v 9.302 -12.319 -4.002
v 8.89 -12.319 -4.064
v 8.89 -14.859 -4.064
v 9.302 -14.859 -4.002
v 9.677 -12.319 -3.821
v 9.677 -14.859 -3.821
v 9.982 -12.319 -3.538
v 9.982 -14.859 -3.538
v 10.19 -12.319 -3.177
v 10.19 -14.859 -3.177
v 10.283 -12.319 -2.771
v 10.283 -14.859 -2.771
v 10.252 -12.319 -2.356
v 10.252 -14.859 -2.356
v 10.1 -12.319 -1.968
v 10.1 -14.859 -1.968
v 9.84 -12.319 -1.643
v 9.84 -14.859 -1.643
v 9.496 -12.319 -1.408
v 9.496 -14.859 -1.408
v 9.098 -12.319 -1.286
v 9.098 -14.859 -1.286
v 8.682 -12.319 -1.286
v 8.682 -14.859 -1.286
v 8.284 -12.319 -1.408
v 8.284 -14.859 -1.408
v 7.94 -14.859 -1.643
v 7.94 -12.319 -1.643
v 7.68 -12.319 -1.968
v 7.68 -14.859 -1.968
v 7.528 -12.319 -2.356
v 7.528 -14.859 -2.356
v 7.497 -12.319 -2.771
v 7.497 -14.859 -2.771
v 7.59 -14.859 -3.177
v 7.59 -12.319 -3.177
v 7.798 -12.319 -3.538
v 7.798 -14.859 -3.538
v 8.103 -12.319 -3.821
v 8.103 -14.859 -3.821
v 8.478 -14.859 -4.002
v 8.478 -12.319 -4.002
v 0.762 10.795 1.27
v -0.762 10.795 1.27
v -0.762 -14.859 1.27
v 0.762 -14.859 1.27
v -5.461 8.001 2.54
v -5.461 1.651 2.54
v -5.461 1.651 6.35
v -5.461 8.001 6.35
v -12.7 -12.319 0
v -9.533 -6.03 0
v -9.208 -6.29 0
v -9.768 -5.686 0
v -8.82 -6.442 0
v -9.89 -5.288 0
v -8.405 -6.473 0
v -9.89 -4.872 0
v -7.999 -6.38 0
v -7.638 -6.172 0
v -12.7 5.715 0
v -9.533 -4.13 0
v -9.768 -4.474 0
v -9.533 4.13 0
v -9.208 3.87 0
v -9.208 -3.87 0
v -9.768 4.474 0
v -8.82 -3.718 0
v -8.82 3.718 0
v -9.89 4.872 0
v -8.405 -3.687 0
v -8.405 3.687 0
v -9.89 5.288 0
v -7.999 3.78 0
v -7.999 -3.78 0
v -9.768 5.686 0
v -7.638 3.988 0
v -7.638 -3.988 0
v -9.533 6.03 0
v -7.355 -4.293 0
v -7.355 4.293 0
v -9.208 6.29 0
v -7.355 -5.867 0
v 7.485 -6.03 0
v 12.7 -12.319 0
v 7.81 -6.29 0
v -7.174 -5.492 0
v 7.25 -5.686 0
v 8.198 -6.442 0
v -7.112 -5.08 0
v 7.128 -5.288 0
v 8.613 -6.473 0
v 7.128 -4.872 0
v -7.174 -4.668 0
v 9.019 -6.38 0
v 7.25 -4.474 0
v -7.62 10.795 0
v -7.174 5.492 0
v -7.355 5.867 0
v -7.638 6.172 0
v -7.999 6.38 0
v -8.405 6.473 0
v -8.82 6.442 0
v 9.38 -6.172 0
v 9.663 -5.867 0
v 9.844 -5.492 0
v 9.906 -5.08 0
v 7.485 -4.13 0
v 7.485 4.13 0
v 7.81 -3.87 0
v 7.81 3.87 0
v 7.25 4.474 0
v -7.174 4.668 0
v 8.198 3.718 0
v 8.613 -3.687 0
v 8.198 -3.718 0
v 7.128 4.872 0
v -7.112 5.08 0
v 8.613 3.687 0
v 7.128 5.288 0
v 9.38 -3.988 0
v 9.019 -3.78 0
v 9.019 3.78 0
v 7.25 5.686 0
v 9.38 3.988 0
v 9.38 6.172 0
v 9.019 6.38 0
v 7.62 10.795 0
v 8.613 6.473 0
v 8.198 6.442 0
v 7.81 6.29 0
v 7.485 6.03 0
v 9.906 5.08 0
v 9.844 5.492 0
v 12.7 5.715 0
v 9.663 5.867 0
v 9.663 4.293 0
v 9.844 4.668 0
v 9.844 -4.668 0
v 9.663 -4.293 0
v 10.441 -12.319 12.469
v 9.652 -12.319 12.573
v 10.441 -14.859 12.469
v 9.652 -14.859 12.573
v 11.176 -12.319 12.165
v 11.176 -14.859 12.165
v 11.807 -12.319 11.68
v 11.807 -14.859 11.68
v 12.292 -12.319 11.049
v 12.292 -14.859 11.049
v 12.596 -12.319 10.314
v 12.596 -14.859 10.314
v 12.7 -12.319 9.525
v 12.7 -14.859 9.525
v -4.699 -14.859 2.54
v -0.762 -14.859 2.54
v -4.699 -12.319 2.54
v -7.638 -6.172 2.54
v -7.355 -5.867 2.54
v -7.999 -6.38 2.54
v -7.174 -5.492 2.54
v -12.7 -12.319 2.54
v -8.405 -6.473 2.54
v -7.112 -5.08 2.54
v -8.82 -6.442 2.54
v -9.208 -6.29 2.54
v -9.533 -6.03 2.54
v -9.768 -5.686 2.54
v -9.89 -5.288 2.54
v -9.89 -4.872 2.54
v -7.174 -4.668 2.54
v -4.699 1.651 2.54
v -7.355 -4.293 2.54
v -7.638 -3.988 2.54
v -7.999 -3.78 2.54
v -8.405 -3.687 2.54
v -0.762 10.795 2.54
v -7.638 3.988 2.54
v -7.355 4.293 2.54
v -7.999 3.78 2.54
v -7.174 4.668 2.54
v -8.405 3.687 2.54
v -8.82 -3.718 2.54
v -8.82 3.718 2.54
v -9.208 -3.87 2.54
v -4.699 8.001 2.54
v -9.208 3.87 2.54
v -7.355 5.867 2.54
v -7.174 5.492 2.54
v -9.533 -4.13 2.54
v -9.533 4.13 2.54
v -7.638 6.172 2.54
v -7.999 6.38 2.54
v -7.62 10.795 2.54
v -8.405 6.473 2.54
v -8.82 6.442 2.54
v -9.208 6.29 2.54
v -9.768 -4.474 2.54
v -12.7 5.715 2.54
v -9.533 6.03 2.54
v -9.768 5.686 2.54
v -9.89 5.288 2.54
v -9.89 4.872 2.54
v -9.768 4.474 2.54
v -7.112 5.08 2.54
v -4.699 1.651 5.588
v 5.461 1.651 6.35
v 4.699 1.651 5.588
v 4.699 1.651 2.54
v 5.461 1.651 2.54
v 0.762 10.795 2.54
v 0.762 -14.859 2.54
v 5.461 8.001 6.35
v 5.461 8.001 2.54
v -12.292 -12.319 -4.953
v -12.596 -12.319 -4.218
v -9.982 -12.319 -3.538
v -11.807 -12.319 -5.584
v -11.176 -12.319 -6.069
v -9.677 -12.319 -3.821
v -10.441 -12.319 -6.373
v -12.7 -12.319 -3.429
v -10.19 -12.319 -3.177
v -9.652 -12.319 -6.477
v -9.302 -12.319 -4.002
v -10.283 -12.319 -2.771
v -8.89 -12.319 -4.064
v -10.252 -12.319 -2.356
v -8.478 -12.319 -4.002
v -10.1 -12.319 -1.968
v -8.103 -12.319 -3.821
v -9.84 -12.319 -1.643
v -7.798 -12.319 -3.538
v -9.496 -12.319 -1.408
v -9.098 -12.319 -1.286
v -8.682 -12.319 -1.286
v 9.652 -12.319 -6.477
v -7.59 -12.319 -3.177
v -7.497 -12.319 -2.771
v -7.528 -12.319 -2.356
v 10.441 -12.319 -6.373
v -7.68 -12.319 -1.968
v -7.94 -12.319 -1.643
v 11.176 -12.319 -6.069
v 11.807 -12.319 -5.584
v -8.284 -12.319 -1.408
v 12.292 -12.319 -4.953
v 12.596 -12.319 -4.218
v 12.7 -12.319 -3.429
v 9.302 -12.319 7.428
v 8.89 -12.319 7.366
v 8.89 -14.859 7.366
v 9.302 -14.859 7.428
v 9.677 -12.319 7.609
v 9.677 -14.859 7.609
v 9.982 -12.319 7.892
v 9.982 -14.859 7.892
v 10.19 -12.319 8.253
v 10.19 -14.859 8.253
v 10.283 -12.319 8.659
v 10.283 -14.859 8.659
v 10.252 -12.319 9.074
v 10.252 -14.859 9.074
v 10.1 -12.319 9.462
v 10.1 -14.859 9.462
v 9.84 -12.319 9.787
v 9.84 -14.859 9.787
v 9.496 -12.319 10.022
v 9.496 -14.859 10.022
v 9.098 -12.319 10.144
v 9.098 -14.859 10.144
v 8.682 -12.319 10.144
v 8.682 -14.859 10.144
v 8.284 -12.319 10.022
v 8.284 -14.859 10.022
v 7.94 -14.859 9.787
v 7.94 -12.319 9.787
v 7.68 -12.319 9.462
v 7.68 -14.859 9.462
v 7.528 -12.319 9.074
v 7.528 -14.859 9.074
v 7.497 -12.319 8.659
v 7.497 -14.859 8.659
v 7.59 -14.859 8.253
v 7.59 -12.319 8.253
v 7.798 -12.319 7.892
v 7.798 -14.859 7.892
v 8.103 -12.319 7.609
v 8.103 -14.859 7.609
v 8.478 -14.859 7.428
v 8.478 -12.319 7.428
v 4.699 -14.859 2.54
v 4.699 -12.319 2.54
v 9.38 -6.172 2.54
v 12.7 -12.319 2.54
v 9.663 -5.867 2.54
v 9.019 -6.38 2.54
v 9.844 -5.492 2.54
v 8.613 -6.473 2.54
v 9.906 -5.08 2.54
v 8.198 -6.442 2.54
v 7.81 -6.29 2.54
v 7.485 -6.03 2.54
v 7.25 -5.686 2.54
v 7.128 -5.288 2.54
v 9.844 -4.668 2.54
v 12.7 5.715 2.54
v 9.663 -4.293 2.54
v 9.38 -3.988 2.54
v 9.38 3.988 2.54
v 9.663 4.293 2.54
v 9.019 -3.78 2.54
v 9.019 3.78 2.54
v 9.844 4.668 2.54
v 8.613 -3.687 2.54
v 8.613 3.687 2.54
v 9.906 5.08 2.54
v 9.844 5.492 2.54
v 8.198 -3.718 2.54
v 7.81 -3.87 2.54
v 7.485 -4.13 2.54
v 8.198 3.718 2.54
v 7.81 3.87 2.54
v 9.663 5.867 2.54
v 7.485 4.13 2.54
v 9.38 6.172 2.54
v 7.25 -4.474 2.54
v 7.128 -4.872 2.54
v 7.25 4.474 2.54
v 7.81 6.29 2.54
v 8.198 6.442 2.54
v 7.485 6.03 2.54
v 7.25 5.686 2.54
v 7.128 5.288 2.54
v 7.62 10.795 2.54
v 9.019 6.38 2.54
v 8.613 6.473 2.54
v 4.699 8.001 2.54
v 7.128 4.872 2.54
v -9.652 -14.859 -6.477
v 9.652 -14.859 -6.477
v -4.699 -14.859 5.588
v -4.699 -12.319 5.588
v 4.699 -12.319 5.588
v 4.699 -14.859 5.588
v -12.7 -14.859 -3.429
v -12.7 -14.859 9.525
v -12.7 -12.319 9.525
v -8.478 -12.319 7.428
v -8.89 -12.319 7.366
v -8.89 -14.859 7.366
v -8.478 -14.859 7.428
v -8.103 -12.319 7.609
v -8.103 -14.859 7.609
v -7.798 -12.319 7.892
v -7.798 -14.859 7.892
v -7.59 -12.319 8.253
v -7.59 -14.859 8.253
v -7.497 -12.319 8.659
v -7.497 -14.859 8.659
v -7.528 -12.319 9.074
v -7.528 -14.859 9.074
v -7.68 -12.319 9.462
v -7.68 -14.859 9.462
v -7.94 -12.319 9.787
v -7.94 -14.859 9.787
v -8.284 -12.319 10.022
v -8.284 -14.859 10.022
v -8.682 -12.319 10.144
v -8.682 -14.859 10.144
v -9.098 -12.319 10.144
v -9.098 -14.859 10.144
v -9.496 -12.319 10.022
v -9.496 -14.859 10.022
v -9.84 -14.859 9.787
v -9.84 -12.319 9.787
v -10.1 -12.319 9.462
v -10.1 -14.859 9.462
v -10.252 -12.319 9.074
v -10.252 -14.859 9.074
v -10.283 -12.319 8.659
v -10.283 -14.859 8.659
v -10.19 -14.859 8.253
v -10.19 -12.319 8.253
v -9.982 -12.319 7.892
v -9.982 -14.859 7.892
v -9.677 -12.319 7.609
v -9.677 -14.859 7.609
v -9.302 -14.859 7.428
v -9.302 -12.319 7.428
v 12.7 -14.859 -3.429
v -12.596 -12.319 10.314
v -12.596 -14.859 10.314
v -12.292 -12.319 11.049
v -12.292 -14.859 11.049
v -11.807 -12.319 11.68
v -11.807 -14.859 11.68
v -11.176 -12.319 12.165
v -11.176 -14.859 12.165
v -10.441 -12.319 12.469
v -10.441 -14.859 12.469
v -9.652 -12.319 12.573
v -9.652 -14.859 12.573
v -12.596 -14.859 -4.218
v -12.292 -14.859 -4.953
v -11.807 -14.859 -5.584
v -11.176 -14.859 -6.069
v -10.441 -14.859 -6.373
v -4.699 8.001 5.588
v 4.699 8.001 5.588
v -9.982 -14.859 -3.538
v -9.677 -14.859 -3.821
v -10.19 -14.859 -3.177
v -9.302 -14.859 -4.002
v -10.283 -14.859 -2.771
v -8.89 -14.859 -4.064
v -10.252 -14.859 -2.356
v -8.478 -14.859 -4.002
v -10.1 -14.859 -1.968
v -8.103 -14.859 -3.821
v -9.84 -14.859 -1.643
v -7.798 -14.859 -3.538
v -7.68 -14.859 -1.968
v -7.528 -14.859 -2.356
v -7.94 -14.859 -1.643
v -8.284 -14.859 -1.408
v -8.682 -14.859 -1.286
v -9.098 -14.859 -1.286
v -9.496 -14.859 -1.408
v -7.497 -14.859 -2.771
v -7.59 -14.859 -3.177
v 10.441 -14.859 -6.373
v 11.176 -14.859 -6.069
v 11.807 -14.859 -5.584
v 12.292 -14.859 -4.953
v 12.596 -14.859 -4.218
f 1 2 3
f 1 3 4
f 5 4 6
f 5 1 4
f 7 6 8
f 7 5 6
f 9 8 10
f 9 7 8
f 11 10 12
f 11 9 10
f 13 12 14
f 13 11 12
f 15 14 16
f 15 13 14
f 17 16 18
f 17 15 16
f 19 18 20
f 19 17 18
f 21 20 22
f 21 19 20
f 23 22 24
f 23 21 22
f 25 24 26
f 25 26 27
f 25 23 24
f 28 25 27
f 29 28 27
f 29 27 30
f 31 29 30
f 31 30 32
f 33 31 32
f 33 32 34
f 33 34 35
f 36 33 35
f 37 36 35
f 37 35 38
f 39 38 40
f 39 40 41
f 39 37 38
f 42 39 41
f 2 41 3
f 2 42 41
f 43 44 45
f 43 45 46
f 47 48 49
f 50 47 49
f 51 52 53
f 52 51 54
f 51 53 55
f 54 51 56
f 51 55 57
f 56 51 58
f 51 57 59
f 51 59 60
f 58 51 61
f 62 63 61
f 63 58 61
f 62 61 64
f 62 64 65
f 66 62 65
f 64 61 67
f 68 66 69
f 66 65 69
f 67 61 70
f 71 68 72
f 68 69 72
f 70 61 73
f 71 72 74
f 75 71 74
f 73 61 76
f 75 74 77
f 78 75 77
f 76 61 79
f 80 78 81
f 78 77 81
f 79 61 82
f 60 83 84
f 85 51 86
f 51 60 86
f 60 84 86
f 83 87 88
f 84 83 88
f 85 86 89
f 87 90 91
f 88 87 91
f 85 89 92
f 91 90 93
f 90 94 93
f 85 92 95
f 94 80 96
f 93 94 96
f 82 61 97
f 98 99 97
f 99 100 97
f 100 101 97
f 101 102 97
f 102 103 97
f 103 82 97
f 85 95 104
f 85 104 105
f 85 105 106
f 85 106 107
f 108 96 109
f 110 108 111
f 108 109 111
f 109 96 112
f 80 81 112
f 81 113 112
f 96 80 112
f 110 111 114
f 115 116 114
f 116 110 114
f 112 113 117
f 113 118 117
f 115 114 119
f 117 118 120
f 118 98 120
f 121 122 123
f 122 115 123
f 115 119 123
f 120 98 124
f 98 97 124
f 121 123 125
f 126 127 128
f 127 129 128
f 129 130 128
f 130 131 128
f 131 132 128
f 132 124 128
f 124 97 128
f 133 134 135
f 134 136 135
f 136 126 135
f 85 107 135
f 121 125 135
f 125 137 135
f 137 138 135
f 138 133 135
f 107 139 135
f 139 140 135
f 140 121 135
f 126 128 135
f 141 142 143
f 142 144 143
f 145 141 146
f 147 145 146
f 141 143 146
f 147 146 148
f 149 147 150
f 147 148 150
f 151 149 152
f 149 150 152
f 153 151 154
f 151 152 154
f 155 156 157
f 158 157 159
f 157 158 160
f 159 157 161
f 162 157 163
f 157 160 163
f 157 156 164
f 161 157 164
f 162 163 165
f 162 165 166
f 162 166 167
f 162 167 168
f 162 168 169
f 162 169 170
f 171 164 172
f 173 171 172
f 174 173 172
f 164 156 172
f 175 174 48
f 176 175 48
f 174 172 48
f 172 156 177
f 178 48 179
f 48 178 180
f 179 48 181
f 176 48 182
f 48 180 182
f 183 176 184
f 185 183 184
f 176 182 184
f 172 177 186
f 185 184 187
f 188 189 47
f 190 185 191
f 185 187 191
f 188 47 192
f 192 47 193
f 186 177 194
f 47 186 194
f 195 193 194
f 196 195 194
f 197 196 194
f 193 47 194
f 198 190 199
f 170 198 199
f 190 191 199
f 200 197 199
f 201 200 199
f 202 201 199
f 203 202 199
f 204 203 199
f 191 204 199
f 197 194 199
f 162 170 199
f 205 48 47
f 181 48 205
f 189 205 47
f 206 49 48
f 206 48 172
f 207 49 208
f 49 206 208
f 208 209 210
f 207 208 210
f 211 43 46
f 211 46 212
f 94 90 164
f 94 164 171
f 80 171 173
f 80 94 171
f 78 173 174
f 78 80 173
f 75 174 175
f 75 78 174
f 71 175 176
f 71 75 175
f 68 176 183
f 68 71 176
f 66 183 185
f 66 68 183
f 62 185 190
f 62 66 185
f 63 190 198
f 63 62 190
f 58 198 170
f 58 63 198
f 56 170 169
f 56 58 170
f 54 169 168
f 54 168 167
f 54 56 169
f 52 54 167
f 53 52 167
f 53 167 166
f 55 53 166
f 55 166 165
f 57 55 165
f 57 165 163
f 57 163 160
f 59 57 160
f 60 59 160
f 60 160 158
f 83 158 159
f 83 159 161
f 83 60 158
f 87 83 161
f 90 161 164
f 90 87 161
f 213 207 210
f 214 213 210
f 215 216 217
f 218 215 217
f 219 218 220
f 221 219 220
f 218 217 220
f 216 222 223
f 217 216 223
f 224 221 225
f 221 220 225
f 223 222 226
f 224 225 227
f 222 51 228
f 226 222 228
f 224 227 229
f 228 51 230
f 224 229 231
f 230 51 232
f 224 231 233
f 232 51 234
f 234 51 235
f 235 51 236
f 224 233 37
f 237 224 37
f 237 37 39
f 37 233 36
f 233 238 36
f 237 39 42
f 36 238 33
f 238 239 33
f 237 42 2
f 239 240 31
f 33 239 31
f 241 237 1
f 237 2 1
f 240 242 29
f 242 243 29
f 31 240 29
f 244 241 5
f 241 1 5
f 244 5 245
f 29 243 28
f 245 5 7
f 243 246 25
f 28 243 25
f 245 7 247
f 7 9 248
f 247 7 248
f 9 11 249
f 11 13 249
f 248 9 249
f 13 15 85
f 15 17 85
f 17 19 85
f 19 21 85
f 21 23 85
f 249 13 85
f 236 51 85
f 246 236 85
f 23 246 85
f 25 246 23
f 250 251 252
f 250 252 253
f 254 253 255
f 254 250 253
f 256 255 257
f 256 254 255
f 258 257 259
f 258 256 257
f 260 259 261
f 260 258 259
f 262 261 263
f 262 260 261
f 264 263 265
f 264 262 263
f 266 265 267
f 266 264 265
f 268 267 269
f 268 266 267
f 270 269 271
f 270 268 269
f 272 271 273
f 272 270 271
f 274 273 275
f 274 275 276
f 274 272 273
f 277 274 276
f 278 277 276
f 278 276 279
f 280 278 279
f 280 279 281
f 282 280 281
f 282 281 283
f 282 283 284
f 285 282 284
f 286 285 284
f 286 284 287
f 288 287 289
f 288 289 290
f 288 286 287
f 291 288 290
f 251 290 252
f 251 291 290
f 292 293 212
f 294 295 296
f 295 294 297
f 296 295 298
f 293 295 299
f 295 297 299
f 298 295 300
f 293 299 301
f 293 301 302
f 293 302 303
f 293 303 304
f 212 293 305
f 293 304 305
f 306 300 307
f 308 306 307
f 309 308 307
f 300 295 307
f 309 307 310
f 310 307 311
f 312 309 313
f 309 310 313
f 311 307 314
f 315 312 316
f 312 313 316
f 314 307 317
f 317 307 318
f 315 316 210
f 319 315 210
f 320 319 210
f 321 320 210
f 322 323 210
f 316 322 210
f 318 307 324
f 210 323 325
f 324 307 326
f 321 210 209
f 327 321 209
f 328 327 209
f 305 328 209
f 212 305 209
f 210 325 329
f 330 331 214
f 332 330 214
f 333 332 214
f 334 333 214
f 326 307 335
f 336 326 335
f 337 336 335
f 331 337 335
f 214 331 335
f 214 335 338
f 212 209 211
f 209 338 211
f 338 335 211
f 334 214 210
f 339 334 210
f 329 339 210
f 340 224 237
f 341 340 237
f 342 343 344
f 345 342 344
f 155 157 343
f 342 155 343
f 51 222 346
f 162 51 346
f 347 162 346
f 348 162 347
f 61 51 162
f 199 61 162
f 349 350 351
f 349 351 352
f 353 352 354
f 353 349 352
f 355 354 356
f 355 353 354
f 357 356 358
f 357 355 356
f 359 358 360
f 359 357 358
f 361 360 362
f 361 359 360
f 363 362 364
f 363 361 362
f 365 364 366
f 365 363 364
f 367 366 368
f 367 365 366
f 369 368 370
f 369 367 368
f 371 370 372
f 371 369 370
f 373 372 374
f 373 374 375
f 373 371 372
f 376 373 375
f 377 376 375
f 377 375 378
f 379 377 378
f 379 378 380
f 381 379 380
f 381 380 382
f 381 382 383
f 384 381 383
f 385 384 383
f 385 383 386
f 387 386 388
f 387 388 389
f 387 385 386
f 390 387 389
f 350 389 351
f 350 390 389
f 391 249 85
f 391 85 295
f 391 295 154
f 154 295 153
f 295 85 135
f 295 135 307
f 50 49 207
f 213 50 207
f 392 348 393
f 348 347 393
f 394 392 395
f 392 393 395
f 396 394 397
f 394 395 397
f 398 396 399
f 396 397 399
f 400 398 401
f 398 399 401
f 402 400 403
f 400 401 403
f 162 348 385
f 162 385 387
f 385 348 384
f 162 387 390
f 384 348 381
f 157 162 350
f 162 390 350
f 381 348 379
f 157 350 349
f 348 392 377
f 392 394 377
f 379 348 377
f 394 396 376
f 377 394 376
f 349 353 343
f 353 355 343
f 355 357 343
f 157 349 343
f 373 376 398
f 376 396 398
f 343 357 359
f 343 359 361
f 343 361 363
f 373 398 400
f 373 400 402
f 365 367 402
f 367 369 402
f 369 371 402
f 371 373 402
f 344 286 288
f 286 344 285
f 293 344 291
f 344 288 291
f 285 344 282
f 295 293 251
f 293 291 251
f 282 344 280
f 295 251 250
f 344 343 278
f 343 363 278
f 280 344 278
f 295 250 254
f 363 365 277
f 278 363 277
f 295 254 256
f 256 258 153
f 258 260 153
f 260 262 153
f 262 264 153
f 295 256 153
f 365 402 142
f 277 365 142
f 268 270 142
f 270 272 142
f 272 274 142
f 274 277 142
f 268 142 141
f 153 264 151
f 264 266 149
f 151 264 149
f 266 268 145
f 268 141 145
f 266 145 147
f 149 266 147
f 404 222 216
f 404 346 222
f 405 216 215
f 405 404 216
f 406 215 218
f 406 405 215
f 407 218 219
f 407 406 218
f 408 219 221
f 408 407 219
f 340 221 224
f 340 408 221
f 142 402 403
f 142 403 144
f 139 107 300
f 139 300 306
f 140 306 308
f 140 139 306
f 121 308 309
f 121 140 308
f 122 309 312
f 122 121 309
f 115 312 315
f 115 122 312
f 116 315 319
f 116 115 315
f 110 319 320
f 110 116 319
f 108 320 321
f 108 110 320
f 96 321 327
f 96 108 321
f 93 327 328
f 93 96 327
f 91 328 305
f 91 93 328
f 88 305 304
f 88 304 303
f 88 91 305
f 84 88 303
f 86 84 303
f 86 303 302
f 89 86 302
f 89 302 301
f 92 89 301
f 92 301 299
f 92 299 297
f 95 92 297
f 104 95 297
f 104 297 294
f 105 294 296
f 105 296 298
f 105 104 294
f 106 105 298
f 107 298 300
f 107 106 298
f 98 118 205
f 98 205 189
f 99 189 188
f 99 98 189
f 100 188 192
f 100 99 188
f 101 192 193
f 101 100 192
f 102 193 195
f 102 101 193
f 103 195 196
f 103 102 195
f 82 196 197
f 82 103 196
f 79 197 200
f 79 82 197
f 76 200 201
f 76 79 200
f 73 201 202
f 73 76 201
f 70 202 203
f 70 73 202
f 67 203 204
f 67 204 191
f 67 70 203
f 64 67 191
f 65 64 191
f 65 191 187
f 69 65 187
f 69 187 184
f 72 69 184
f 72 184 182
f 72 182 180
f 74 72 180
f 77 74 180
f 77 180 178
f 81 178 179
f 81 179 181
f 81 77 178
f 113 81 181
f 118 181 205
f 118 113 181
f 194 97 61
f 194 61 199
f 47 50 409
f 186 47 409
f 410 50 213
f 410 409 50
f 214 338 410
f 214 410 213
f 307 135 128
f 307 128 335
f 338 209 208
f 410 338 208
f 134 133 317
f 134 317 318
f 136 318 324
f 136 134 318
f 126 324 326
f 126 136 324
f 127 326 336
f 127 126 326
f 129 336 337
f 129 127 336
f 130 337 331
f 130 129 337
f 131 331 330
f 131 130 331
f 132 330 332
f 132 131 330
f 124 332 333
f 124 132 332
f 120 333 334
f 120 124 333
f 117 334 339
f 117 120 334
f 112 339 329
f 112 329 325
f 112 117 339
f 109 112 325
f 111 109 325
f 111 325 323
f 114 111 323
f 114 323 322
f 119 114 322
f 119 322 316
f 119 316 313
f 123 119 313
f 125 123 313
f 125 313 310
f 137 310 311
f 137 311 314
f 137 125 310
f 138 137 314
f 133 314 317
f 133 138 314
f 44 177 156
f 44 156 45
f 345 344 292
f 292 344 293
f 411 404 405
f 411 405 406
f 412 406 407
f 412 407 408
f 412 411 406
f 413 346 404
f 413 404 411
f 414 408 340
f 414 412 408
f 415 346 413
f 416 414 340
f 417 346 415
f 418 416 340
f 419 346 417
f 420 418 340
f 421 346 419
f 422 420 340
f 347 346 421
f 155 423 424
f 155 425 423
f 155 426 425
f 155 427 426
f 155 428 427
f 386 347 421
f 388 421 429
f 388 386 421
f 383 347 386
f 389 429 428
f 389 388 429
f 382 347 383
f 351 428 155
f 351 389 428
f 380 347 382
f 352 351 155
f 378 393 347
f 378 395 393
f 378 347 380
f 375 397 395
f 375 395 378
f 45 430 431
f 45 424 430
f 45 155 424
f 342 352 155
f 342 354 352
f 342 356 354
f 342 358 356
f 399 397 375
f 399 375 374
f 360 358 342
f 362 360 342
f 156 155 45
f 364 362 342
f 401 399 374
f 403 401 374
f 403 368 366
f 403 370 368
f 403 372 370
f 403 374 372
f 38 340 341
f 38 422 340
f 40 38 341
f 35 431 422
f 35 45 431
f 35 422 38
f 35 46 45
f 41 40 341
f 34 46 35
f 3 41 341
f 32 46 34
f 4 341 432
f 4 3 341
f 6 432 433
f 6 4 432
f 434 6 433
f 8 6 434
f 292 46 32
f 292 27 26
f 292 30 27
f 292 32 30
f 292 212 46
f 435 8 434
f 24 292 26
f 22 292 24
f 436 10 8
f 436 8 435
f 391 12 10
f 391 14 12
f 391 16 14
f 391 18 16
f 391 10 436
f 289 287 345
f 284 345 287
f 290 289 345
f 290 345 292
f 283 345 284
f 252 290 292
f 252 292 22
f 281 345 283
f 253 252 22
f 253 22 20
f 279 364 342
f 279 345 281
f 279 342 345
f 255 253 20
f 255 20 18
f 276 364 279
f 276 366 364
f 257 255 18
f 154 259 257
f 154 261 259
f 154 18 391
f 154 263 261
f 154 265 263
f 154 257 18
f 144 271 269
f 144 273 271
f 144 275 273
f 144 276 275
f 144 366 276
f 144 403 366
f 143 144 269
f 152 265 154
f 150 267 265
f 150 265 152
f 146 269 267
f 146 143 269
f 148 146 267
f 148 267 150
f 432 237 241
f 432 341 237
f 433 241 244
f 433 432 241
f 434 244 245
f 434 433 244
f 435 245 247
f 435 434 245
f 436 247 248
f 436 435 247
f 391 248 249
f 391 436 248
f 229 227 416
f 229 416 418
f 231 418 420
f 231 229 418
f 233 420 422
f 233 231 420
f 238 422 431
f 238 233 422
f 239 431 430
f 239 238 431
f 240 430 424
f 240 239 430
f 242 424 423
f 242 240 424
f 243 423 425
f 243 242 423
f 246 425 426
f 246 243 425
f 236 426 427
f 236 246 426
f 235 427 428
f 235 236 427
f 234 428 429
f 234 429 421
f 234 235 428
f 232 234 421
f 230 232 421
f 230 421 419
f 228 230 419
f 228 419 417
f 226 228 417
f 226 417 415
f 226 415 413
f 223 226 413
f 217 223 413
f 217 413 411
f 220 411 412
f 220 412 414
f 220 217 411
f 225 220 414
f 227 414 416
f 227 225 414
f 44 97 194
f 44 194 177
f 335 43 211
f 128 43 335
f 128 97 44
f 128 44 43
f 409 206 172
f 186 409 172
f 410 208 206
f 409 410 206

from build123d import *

# Parameters (mm, degrees)
SKETCH1_W           = 25.4
SKETCH1_H           = 21.59
SKETCH1_R           = 1.397
BOSS_EXTRUDE1_DEPTH = 2.54
SKETCH2_W           = 1.524
SKETCH2_H           = 21.59
CUT_EXTRUDE1_DEPTH  = 1.27
BOSS_EXTRUDE3_DEPTH = 1.524
SKETCH8_W           = 25.4
SKETCH8_H           = 19.05
SKETCH8_R           = 1.397
BOSS_EXTRUDE4_DEPTH = 2.54
CUT_EXTRUDE2_DEPTH  = 15.24
CUT_EXTRUDE3_DEPTH  = 15.24
BOSS_EXTRUDE5_DEPTH = 6.35
CHAMFER1_SIZE       = 5.08
FILLET1_R           = 3.048


with BuildPart() as part:
    # Sketch1 → Boss-Extrude1 (new body)
    with BuildSketch(Plane.XY):
        Rectangle(SKETCH1_W, SKETCH1_H)
        with Locations((-8.509, 5.08)):
            Circle(SKETCH1_R, mode=Mode.SUBTRACT)
        with Locations((8.509, 5.08)):
            Circle(SKETCH1_R, mode=Mode.SUBTRACT)
        with Locations((8.509, -5.08)):
            Circle(SKETCH1_R, mode=Mode.SUBTRACT)
        with Locations((-8.509, -5.08)):
            Circle(SKETCH1_R, mode=Mode.SUBTRACT)
    extrude(amount=BOSS_EXTRUDE1_DEPTH)

    # Sketch2 → Cut-Extrude1 (cut)
    with BuildSketch(Plane.XY.offset(2.54)):
        Rectangle(SKETCH2_W, SKETCH2_H)
    extrude(amount=-CUT_EXTRUDE1_DEPTH, mode=Mode.SUBTRACT)

    # Sketch7 → Boss-Extrude3 (add)
    with BuildSketch(Plane.XZ.offset(10.795)):
        Polygon((-0.762, 2.54), (-12.7, 2.54), (-12.7, 0), (12.7, 0), (12.7, 2.54), (0.762, 2.54), (0.762, 1.27), (-0.762, 1.27), align=None)
    extrude(amount=BOSS_EXTRUDE3_DEPTH)

    # Sketch8 → Boss-Extrude4 (add)
    with BuildSketch(Plane.XZ.offset(12.319)):
        with Locations((0, 3.048)):
            Rectangle(SKETCH8_W, SKETCH8_H)
        with Locations(Location((-8.89, 8.763, 0), (0, 0, 270))):
            Circle(SKETCH8_R, mode=Mode.SUBTRACT)
        with Locations(Location((8.89, 8.763, 0), (0, 0, 270))):
            Circle(SKETCH8_R, mode=Mode.SUBTRACT)
        with Locations(Location((-8.89, -2.667, 0), (0, 0, 270))):
            Circle(SKETCH8_R, mode=Mode.SUBTRACT)
        with Locations(Location((8.89, -2.667, 0), (0, 0, 270))):
            Circle(SKETCH8_R, mode=Mode.SUBTRACT)
    extrude(amount=BOSS_EXTRUDE4_DEPTH)

    # Sketch5 → Cut-Extrude2 (cut)
    with BuildSketch(Plane(origin=(0, -1.905, 0), x_dir=(-1, 0, 0), z_dir=(0, -1, 0))):
        Polygon((-4.445, -2.54), (-4.445, -5.334), (4.445, -5.334), (4.445, -2.54), (4.699, -2.54), (4.699, -5.588), (-4.699, -5.588), (-4.699, -2.54), align=None)
    extrude(amount=CUT_EXTRUDE2_DEPTH, mode=Mode.SUBTRACT)

    # Sketch9 → Cut-Extrude3 (cut)
    with BuildSketch(Plane(origin=(0, -12.319, 0), x_dir=(1, 0, 0), z_dir=(0, 1, 0))):
        Polygon((-0.762, -1.27), (0.762, -1.27), (0.762, -2.54), (4.445, -2.54), (4.445, -5.334), (-4.445, -5.334), (-4.445, -2.54), (-0.762, -2.54), align=None)
    extrude(amount=-CUT_EXTRUDE3_DEPTH, mode=Mode.SUBTRACT)

    # Sketch11 → Boss-Extrude5 (add)
    with BuildSketch(Plane(origin=(0, 1.651, 0), x_dir=(1, 0, 0), z_dir=(0, 1, 0))):
        Polygon((-4.699, -2.54), (-5.461, -2.54), (-5.461, -6.35), (5.461, -6.35), (5.461, -2.54), (4.699, -2.54), (4.699, -5.588), (-4.699, -5.588), align=None)
    extrude(amount=BOSS_EXTRUDE5_DEPTH)

    # Chamfer1
    chamfer1_edges = [part.edges().sort_by_distance(p)[0] for p in [
        (-12.7, 10.795, 1.27),
        (12.7, 10.795, 1.27),
    ]]
    chamfer(chamfer1_edges, length=CHAMFER1_SIZE)

    # Fillet1
    fillet1_edges = [part.edges().sort_by_distance(p)[0] for p in [
        (-12.7, -13.589, 12.573),
        (-12.7, -13.589, -6.477),
        (12.7, -13.589, -6.477),
        (12.7, -13.589, 12.573),
    ]]
    fillet(fillet1_edges, radius=FILLET1_R)


solid = part.part
